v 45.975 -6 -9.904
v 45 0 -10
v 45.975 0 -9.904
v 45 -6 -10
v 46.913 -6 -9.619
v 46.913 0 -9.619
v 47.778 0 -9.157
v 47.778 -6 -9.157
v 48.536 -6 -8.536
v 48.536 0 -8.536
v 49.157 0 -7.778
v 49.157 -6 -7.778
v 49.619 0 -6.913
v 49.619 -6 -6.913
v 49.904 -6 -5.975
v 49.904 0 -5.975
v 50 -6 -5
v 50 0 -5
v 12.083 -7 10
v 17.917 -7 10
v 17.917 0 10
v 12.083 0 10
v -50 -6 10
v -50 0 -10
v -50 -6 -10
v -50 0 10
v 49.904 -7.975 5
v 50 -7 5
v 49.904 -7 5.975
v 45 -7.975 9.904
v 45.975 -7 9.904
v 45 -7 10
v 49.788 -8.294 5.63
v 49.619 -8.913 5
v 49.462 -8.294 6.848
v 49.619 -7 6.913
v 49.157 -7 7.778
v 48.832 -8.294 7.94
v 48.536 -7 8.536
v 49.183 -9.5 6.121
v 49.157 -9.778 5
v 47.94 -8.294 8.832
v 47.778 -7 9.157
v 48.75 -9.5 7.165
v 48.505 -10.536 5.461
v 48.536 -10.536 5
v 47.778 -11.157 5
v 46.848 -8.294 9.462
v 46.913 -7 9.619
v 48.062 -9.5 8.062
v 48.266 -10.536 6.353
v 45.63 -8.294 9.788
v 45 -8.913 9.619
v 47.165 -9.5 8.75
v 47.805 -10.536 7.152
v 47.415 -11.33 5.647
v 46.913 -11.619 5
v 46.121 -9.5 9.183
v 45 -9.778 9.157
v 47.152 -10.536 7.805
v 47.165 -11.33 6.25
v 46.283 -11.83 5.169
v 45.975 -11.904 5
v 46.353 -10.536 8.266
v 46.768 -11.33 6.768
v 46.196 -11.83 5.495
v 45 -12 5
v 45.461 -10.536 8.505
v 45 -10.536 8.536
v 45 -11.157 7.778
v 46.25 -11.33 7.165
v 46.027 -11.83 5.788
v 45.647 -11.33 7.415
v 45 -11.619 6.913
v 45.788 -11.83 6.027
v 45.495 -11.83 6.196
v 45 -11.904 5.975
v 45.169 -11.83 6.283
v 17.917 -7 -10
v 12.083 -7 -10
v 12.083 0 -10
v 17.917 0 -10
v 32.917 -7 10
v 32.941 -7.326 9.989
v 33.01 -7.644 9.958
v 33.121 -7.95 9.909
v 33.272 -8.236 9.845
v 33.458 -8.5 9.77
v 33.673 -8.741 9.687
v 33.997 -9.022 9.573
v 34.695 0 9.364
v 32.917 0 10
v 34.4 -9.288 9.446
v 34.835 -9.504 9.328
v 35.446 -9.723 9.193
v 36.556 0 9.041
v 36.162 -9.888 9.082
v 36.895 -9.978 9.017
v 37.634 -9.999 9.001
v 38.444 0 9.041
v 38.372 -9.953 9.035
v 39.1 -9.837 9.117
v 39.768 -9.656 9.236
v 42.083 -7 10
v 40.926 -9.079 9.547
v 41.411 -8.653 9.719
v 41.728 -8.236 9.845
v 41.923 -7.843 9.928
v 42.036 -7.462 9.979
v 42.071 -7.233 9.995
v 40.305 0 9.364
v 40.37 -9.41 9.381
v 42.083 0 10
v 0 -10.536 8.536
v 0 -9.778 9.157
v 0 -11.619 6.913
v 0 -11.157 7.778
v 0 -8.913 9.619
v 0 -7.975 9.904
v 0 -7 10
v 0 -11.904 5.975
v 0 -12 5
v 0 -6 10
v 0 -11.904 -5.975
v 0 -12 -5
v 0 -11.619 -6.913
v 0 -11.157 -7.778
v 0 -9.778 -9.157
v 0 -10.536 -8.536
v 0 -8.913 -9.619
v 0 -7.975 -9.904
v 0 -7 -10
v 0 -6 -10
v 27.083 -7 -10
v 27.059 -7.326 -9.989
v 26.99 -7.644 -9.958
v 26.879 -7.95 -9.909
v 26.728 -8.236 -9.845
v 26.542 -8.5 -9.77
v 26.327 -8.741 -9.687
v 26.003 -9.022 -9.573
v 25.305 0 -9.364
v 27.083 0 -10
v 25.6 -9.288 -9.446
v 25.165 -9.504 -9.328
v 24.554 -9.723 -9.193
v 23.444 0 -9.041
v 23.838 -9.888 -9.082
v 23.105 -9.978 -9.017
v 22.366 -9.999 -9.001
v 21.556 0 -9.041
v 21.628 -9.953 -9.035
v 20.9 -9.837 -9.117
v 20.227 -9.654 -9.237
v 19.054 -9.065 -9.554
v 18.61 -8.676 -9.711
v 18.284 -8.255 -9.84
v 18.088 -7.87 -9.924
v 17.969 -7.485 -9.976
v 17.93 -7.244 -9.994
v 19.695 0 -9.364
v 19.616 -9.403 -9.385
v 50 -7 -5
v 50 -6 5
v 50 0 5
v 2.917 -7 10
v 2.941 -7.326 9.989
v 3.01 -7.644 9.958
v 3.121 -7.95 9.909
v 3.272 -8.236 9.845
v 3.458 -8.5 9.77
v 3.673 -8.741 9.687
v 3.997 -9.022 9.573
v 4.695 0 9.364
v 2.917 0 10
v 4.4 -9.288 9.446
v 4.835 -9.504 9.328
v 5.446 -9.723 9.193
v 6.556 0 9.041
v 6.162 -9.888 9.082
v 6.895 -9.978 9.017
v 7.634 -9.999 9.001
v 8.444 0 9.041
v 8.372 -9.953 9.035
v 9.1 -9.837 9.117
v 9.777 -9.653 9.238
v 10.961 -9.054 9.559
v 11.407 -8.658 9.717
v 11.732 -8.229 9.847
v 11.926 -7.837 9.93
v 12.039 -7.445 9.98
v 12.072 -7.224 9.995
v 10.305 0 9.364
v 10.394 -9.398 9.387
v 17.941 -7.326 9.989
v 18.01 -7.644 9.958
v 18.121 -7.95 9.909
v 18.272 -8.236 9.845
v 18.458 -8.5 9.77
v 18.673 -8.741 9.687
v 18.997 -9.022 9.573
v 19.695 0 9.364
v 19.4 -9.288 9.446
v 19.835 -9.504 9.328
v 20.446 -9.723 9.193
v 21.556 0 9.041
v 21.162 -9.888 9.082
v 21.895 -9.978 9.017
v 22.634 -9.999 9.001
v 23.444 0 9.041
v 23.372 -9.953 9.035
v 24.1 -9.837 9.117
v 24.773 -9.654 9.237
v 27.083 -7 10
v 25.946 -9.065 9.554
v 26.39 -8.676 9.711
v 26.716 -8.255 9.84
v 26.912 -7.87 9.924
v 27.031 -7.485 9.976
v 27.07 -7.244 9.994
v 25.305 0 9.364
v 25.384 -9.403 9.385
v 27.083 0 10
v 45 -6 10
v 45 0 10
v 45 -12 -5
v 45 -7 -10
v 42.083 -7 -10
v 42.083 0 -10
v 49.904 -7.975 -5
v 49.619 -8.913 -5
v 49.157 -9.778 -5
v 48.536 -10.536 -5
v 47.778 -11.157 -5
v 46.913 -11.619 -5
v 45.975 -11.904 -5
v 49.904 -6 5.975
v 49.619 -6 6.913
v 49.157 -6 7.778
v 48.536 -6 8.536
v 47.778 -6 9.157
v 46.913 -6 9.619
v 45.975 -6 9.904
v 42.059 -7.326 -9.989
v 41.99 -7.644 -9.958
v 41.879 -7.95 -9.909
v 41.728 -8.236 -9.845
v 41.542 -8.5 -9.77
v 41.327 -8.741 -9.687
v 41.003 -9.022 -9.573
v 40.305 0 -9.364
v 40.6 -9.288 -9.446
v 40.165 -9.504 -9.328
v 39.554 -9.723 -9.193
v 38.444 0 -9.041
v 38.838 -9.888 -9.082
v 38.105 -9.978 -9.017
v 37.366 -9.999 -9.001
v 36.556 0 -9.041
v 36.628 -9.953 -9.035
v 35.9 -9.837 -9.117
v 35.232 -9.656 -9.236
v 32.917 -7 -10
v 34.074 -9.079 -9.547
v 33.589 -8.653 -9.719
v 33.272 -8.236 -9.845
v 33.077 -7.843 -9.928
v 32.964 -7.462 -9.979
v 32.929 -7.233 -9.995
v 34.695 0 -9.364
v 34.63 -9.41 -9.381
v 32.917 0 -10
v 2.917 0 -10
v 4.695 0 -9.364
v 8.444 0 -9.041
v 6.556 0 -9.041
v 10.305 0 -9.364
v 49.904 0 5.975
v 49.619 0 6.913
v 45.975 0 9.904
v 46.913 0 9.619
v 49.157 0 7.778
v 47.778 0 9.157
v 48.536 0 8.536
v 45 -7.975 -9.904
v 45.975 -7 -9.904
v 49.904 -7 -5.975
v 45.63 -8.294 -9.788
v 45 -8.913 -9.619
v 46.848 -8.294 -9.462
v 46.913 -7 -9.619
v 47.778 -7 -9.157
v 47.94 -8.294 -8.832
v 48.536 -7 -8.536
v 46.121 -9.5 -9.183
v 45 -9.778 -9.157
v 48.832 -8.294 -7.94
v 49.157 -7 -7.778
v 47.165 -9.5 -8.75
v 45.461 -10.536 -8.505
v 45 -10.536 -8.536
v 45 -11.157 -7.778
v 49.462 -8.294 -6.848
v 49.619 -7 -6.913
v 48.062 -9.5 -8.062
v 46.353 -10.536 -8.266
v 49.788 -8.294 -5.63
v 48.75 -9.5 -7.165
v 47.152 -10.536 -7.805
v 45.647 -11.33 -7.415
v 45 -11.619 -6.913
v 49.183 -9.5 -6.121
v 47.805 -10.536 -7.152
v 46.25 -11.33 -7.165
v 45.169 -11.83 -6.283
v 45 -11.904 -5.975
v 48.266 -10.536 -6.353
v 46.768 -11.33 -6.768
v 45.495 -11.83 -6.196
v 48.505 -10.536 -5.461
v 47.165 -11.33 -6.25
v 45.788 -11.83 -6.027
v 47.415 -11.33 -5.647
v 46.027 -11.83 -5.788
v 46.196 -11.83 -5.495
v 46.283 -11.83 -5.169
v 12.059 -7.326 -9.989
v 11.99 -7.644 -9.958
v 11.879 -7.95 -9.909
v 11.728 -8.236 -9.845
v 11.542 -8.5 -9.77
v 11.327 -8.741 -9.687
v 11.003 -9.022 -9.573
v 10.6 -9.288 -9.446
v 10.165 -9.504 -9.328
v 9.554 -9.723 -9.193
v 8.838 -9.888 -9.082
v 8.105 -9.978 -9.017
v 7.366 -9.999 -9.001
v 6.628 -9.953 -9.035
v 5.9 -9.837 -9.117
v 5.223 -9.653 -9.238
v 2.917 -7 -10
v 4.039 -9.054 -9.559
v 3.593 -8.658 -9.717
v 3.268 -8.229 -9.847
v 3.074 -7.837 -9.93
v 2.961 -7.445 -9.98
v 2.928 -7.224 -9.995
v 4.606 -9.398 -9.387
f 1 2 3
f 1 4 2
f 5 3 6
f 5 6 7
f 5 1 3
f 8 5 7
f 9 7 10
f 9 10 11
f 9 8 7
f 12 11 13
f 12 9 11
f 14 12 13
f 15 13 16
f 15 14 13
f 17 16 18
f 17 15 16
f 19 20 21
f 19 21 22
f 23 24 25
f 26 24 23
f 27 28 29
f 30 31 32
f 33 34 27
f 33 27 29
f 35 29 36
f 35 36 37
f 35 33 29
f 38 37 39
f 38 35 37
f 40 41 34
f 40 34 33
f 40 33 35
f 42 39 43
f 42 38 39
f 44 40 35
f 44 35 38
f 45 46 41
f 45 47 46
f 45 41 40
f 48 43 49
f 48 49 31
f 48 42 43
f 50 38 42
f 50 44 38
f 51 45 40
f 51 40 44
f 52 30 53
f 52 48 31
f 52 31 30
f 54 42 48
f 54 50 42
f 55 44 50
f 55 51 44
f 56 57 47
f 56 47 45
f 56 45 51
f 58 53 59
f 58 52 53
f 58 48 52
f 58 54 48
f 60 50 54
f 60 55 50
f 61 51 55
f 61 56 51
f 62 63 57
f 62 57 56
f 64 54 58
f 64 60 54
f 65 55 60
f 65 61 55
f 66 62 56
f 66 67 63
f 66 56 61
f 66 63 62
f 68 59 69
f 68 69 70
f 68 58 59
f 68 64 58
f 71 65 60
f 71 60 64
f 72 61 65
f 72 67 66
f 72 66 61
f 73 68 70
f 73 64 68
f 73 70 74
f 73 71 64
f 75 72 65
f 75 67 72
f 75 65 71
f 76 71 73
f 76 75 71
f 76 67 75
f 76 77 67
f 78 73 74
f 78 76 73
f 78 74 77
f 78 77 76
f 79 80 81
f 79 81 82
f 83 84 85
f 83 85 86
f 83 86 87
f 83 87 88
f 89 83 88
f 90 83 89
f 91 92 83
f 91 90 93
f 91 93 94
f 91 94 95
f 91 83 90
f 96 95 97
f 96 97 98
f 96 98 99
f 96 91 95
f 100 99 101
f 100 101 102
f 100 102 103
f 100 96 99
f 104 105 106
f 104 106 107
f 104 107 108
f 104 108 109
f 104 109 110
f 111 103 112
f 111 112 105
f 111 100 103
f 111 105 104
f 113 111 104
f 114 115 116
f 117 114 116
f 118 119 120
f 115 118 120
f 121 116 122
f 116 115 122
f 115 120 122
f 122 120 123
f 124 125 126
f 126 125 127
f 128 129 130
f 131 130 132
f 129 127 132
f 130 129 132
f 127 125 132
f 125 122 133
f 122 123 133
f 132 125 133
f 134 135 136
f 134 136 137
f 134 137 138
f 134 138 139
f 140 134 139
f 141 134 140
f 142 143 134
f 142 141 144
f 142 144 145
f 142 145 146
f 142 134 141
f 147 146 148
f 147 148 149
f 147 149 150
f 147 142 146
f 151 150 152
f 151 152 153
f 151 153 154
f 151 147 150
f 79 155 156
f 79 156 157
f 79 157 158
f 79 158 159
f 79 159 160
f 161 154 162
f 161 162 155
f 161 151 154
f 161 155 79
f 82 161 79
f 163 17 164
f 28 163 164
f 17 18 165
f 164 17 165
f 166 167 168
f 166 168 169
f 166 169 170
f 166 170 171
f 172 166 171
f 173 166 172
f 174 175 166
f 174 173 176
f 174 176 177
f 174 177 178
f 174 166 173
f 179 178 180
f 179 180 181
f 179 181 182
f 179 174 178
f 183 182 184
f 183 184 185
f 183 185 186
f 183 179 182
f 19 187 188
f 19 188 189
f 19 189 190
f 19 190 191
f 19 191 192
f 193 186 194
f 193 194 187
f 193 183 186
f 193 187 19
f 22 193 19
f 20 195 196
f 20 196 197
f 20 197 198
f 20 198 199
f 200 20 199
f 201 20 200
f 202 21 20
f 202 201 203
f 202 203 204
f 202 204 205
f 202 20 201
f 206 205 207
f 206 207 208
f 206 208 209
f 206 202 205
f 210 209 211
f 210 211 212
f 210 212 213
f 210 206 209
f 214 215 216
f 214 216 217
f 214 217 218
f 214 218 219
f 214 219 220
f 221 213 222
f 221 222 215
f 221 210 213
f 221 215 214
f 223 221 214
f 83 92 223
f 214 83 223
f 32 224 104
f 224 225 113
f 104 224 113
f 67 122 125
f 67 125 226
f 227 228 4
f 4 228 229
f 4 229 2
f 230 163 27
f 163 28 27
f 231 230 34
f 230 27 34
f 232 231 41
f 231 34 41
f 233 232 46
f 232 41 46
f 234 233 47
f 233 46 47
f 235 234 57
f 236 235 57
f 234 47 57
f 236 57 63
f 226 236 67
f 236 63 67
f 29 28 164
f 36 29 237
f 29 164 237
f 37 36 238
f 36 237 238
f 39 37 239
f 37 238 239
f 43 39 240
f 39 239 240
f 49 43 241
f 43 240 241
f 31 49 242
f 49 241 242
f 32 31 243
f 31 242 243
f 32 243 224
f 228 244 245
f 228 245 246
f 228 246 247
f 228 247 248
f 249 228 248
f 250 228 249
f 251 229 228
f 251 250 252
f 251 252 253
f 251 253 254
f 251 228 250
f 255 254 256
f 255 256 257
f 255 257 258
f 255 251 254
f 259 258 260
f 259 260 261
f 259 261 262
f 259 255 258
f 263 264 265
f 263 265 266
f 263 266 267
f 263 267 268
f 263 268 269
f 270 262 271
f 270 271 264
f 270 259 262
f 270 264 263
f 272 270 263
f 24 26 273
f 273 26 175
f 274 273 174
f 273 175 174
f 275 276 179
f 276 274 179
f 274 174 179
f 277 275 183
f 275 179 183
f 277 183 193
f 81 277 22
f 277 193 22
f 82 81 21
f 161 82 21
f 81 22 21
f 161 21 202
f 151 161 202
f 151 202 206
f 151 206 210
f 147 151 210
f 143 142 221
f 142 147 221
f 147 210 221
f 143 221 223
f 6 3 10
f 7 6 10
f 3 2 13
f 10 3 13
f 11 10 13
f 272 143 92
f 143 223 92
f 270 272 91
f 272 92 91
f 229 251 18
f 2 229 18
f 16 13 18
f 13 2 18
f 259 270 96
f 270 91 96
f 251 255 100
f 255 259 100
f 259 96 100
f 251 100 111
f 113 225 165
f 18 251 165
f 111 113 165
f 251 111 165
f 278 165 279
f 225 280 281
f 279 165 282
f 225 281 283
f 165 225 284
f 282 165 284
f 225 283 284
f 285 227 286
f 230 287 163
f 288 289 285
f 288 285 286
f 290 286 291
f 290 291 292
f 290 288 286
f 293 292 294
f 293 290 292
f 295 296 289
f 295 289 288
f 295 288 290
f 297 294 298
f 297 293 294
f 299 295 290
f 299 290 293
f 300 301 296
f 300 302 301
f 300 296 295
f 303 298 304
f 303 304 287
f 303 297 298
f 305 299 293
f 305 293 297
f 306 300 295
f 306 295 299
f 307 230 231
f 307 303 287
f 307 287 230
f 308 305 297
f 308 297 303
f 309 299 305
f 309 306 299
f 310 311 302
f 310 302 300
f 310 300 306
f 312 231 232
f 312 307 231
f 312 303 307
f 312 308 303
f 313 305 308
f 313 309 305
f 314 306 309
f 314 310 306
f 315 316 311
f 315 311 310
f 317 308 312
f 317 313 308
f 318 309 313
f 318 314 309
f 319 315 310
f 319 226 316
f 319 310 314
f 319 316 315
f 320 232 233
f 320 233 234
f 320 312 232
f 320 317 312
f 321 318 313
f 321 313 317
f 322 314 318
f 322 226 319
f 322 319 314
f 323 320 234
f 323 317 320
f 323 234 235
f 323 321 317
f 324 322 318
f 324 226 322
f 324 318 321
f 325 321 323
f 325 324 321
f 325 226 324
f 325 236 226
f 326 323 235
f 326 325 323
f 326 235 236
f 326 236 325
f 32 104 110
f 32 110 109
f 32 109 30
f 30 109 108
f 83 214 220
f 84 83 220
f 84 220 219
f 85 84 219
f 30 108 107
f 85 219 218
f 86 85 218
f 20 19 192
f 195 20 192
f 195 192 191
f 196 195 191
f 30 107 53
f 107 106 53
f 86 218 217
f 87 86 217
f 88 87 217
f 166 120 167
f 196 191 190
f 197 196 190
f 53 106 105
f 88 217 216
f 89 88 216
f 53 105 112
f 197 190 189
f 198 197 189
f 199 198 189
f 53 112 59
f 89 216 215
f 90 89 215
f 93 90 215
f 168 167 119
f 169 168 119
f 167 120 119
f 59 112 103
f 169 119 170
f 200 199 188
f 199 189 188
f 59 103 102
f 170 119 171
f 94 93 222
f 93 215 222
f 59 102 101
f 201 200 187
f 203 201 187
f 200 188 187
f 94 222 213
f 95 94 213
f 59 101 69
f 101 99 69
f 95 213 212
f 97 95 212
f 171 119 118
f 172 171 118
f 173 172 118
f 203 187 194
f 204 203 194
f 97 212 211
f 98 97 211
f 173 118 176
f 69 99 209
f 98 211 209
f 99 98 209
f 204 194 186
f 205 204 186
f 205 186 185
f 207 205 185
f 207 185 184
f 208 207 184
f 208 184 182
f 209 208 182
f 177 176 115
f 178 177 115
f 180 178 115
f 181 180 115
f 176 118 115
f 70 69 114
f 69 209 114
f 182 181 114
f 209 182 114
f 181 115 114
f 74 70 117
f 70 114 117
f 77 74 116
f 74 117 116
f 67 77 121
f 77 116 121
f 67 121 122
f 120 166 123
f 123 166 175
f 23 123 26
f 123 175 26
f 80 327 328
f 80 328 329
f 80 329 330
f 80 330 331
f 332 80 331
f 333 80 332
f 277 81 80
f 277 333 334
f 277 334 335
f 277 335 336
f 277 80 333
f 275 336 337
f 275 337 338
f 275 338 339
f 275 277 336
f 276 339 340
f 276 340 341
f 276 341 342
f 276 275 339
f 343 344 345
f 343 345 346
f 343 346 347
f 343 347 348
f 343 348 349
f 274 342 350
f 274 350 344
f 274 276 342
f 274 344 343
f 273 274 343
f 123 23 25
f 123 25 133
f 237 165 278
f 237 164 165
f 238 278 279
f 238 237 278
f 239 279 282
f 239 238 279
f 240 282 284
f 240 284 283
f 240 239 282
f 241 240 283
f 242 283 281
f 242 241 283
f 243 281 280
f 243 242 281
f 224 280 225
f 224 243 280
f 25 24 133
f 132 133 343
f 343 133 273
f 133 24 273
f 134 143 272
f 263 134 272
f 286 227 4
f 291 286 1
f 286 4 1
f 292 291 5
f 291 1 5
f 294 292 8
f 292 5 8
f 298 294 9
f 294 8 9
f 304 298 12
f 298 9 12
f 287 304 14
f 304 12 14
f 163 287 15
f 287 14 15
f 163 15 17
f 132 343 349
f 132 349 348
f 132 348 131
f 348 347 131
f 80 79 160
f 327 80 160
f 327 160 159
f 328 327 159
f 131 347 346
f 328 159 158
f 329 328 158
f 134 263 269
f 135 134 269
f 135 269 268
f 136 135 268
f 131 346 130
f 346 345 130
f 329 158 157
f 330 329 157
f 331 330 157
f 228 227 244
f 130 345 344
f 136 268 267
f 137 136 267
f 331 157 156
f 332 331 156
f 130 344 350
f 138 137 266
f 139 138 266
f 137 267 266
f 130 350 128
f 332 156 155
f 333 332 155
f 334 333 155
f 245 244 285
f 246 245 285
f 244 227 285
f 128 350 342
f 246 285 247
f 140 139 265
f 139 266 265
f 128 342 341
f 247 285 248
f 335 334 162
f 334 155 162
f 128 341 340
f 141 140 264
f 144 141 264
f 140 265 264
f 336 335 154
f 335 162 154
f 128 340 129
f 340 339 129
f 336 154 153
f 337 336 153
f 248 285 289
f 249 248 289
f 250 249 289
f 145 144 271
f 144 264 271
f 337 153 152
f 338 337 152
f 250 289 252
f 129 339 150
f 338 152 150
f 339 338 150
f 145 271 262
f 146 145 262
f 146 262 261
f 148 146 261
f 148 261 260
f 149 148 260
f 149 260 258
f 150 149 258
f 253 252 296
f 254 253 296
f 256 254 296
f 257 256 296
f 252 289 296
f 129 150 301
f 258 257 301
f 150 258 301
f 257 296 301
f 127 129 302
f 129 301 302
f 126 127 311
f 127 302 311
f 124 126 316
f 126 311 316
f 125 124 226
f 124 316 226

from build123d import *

# Parameters (mm, degrees)
F0_W     = 100
F0_H     = 20
F1_DEPTH = 6
F2_R     = 5
F4_DEPTH = 6
F5_R     = 5
F7_DEPTH = 37


with BuildPart() as f1:
    # F0 (on Front) → F1 (new body)
    with BuildSketch(Plane.XZ):
        Rectangle(F0_W, F0_H)
    extrude(amount=F1_DEPTH)

    # F2
    f2_edges = [f1.edges().sort_by_distance(p)[0] for p in [
        (50, -3, 10),
        (50, -3, -10),
    ]]
    fillet(f2_edges, radius=F2_R)

    # F3 (on face) → F4 (join)
    with BuildSketch(Plane.XZ.offset(6)):
        with BuildLine():
            Line((45, 10), (0, 10))
            Line((0, 10), (0, -10))
            Line((0, -10), (45, -10))
            ThreePointArc((45, -10), (48.5355339059, -8.5355339059), (50, -5))
            Line((50, -5), (50, 5))
            ThreePointArc((50, 5), (48.5355339059, 8.5355339059), (45, 10))
        make_face()
    extrude(amount=F4_DEPTH)

    # F5
    f5_edges = [f1.edges().sort_by_distance(p)[0] for p in [
        (22.5, -12, 10),
    ]]
    fillet(f5_edges, radius=F5_R)

    # F6 (on Front) → F7 (cut)
    with BuildSketch(Plane.XZ):
        with BuildLine():
            ThreePointArc((15, 11.9532615303), (12.4128794991, 15.6125178063), (11.5, 20))
            ThreePointArc((11.5, 20), (12.4128794991, 24.3874821937), (15, 28.0467384697))
            ThreePointArc((15, 28.0467384697), (-3.5, 20), (15, 11.9532615303))
        make_face()
        with BuildLine():
            ThreePointArc((48.5, 20), (41.8874821937, 30.0871205009), (30, 28.0467384697))
            ThreePointArc((30, 28.0467384697), (32.5871205009, 24.3874821937), (33.5, 20))
            ThreePointArc((33.5, 20), (32.5871205009, 15.6125178063), (30, 11.9532615303))
            ThreePointArc((30, 11.9532615303), (41.8874821937, 9.9128794991), (48.5, 20))
        make_face()
        with BuildLine():
            Line((26.5, 20), (18.5, 20))
            ThreePointArc((18.5, 20), (17.5871205009, 15.6125178063), (15, 11.9532615303))
            ThreePointArc((15, 11.9532615303), (22.5, 9), (30, 11.9532615303))
            ThreePointArc((30, 11.9532615303), (27.4128794991, 15.6125178063), (26.5, 20))
        make_face()
        with BuildLine():
            ThreePointArc((15, -28.0467384697), (11.5, -20), (15, -11.9532615303))
            ThreePointArc((15, -11.9532615303), (-3.5, -20), (15, -28.0467384697))
        make_face()
        with BuildLine():
            ThreePointArc((15, -11.9532615303), (17.5871205009, -15.6125178063), (18.5, -20))
            ThreePointArc((18.5, -20), (17.5871205009, -24.3874821937), (15, -28.0467384697))
            ThreePointArc((15, -28.0467384697), (22.5, -31), (30, -28.0467384697))
            ThreePointArc((30, -28.0467384697), (26.5, -20), (30, -11.9532615303))
            ThreePointArc((30, -11.9532615303), (22.5, -9), (15, -11.9532615303))
        make_face()
        with BuildLine():
            ThreePointArc((48.5, -20), (41.8874821937, -9.9128794991), (30, -11.9532615303))
            ThreePointArc((30, -11.9532615303), (32.5871205009, -15.6125178063), (33.5, -20))
            ThreePointArc((33.5, -20), (32.5871205009, -24.3874821937), (30, -28.0467384697))
            ThreePointArc((30, -28.0467384697), (41.8874821937, -30.0871205009), (48.5, -20))
        make_face()
    extrude(amount=F7_DEPTH, mode=Mode.SUBTRACT)


solid = f1.part
